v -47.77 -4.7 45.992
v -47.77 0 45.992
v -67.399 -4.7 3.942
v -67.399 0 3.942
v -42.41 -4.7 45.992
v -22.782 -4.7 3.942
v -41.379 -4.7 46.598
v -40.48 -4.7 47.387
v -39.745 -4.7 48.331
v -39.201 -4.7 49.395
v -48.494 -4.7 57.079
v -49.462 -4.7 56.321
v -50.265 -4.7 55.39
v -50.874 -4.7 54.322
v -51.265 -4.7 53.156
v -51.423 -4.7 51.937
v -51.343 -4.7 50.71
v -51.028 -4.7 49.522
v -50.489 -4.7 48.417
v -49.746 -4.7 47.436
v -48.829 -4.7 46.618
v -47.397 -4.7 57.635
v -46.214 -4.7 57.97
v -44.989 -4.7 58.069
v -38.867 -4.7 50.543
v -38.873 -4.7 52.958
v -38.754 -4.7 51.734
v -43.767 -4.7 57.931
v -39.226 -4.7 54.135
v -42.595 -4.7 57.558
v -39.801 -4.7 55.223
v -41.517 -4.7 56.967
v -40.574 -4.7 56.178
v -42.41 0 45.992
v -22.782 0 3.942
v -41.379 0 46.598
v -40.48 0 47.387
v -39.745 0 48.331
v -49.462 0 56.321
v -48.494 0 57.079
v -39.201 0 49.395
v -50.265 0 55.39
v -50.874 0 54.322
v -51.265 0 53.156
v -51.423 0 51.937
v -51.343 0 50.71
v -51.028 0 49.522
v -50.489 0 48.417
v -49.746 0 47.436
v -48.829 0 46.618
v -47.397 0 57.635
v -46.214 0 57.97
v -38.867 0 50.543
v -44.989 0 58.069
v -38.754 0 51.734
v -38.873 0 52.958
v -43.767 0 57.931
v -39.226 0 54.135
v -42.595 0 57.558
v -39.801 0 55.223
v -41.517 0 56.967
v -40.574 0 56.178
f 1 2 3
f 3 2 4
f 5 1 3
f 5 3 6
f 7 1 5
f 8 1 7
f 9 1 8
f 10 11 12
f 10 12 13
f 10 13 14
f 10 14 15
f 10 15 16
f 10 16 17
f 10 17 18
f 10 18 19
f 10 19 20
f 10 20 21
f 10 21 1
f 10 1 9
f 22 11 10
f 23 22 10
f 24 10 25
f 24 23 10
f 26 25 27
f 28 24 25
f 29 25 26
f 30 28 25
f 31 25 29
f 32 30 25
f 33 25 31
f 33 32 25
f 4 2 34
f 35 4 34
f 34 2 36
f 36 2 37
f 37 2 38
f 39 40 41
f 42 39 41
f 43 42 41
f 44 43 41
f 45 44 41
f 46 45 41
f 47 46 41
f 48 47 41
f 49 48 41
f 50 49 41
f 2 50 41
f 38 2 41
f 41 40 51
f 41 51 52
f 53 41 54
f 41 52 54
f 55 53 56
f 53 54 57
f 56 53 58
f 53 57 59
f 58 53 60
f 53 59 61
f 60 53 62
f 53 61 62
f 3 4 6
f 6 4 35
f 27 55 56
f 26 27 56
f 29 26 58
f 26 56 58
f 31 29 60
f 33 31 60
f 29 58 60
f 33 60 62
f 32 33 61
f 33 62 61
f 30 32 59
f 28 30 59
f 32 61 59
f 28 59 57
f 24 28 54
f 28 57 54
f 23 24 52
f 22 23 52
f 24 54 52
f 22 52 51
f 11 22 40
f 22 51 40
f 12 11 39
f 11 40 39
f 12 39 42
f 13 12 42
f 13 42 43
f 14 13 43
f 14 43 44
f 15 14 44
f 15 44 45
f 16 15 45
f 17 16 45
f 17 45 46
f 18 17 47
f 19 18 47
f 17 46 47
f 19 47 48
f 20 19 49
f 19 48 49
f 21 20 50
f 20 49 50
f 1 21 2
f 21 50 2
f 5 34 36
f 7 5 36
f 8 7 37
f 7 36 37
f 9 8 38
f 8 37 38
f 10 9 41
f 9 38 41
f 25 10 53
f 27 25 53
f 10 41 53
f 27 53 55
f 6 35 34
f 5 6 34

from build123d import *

# Parameters (mm, degrees)
F1_DEPTH = 4.7


with BuildPart() as f1:
    # F0 (on Front) → F1 (new body)
    with BuildSketch(Plane.XZ):
        with BuildLine():
            Line((-47.77017605, 45.9924270552), (-67.3986524343, 3.9423387498))
            Line((-67.3986524343, 3.9423387498), (-22.7815322578, 3.9423387498))
            Line((-22.7815322578, 3.9423387498), (-42.4100088013, 45.9924270633))
            ThreePointArc((-42.4100088013, 45.9924270633), (-45.0900924247, 45.3977122077), (-47.77017605, 45.9924270552))
        make_face()
        with BuildLine():
            ThreePointArc((-38.753834, 51.7339706421), (-48.4935075231, 57.0785881851), (-47.77017605, 45.9924270552))
            Line((-47.77017605, 45.9924270552), (-45.0900924343, 51.7339706421))
            Line((-45.0900924343, 51.7339706421), (-42.4100088013, 45.9924270633))
            ThreePointArc((-42.4100088013, 45.9924270633), (-39.7454748862, 48.3305555615), (-38.753834, 51.7339706421))
        make_face()
        with BuildLine():
            Line((-45.0900924343, 51.7339706421), (-47.77017605, 45.9924270552))
            ThreePointArc((-47.77017605, 45.9924270552), (-45.0900924247, 45.3977122077), (-42.4100088013, 45.9924270633))
            Line((-42.4100088013, 45.9924270633), (-45.0900924343, 51.7339706421))
        make_face()
    extrude(amount=F1_DEPTH)


solid = f1.part
